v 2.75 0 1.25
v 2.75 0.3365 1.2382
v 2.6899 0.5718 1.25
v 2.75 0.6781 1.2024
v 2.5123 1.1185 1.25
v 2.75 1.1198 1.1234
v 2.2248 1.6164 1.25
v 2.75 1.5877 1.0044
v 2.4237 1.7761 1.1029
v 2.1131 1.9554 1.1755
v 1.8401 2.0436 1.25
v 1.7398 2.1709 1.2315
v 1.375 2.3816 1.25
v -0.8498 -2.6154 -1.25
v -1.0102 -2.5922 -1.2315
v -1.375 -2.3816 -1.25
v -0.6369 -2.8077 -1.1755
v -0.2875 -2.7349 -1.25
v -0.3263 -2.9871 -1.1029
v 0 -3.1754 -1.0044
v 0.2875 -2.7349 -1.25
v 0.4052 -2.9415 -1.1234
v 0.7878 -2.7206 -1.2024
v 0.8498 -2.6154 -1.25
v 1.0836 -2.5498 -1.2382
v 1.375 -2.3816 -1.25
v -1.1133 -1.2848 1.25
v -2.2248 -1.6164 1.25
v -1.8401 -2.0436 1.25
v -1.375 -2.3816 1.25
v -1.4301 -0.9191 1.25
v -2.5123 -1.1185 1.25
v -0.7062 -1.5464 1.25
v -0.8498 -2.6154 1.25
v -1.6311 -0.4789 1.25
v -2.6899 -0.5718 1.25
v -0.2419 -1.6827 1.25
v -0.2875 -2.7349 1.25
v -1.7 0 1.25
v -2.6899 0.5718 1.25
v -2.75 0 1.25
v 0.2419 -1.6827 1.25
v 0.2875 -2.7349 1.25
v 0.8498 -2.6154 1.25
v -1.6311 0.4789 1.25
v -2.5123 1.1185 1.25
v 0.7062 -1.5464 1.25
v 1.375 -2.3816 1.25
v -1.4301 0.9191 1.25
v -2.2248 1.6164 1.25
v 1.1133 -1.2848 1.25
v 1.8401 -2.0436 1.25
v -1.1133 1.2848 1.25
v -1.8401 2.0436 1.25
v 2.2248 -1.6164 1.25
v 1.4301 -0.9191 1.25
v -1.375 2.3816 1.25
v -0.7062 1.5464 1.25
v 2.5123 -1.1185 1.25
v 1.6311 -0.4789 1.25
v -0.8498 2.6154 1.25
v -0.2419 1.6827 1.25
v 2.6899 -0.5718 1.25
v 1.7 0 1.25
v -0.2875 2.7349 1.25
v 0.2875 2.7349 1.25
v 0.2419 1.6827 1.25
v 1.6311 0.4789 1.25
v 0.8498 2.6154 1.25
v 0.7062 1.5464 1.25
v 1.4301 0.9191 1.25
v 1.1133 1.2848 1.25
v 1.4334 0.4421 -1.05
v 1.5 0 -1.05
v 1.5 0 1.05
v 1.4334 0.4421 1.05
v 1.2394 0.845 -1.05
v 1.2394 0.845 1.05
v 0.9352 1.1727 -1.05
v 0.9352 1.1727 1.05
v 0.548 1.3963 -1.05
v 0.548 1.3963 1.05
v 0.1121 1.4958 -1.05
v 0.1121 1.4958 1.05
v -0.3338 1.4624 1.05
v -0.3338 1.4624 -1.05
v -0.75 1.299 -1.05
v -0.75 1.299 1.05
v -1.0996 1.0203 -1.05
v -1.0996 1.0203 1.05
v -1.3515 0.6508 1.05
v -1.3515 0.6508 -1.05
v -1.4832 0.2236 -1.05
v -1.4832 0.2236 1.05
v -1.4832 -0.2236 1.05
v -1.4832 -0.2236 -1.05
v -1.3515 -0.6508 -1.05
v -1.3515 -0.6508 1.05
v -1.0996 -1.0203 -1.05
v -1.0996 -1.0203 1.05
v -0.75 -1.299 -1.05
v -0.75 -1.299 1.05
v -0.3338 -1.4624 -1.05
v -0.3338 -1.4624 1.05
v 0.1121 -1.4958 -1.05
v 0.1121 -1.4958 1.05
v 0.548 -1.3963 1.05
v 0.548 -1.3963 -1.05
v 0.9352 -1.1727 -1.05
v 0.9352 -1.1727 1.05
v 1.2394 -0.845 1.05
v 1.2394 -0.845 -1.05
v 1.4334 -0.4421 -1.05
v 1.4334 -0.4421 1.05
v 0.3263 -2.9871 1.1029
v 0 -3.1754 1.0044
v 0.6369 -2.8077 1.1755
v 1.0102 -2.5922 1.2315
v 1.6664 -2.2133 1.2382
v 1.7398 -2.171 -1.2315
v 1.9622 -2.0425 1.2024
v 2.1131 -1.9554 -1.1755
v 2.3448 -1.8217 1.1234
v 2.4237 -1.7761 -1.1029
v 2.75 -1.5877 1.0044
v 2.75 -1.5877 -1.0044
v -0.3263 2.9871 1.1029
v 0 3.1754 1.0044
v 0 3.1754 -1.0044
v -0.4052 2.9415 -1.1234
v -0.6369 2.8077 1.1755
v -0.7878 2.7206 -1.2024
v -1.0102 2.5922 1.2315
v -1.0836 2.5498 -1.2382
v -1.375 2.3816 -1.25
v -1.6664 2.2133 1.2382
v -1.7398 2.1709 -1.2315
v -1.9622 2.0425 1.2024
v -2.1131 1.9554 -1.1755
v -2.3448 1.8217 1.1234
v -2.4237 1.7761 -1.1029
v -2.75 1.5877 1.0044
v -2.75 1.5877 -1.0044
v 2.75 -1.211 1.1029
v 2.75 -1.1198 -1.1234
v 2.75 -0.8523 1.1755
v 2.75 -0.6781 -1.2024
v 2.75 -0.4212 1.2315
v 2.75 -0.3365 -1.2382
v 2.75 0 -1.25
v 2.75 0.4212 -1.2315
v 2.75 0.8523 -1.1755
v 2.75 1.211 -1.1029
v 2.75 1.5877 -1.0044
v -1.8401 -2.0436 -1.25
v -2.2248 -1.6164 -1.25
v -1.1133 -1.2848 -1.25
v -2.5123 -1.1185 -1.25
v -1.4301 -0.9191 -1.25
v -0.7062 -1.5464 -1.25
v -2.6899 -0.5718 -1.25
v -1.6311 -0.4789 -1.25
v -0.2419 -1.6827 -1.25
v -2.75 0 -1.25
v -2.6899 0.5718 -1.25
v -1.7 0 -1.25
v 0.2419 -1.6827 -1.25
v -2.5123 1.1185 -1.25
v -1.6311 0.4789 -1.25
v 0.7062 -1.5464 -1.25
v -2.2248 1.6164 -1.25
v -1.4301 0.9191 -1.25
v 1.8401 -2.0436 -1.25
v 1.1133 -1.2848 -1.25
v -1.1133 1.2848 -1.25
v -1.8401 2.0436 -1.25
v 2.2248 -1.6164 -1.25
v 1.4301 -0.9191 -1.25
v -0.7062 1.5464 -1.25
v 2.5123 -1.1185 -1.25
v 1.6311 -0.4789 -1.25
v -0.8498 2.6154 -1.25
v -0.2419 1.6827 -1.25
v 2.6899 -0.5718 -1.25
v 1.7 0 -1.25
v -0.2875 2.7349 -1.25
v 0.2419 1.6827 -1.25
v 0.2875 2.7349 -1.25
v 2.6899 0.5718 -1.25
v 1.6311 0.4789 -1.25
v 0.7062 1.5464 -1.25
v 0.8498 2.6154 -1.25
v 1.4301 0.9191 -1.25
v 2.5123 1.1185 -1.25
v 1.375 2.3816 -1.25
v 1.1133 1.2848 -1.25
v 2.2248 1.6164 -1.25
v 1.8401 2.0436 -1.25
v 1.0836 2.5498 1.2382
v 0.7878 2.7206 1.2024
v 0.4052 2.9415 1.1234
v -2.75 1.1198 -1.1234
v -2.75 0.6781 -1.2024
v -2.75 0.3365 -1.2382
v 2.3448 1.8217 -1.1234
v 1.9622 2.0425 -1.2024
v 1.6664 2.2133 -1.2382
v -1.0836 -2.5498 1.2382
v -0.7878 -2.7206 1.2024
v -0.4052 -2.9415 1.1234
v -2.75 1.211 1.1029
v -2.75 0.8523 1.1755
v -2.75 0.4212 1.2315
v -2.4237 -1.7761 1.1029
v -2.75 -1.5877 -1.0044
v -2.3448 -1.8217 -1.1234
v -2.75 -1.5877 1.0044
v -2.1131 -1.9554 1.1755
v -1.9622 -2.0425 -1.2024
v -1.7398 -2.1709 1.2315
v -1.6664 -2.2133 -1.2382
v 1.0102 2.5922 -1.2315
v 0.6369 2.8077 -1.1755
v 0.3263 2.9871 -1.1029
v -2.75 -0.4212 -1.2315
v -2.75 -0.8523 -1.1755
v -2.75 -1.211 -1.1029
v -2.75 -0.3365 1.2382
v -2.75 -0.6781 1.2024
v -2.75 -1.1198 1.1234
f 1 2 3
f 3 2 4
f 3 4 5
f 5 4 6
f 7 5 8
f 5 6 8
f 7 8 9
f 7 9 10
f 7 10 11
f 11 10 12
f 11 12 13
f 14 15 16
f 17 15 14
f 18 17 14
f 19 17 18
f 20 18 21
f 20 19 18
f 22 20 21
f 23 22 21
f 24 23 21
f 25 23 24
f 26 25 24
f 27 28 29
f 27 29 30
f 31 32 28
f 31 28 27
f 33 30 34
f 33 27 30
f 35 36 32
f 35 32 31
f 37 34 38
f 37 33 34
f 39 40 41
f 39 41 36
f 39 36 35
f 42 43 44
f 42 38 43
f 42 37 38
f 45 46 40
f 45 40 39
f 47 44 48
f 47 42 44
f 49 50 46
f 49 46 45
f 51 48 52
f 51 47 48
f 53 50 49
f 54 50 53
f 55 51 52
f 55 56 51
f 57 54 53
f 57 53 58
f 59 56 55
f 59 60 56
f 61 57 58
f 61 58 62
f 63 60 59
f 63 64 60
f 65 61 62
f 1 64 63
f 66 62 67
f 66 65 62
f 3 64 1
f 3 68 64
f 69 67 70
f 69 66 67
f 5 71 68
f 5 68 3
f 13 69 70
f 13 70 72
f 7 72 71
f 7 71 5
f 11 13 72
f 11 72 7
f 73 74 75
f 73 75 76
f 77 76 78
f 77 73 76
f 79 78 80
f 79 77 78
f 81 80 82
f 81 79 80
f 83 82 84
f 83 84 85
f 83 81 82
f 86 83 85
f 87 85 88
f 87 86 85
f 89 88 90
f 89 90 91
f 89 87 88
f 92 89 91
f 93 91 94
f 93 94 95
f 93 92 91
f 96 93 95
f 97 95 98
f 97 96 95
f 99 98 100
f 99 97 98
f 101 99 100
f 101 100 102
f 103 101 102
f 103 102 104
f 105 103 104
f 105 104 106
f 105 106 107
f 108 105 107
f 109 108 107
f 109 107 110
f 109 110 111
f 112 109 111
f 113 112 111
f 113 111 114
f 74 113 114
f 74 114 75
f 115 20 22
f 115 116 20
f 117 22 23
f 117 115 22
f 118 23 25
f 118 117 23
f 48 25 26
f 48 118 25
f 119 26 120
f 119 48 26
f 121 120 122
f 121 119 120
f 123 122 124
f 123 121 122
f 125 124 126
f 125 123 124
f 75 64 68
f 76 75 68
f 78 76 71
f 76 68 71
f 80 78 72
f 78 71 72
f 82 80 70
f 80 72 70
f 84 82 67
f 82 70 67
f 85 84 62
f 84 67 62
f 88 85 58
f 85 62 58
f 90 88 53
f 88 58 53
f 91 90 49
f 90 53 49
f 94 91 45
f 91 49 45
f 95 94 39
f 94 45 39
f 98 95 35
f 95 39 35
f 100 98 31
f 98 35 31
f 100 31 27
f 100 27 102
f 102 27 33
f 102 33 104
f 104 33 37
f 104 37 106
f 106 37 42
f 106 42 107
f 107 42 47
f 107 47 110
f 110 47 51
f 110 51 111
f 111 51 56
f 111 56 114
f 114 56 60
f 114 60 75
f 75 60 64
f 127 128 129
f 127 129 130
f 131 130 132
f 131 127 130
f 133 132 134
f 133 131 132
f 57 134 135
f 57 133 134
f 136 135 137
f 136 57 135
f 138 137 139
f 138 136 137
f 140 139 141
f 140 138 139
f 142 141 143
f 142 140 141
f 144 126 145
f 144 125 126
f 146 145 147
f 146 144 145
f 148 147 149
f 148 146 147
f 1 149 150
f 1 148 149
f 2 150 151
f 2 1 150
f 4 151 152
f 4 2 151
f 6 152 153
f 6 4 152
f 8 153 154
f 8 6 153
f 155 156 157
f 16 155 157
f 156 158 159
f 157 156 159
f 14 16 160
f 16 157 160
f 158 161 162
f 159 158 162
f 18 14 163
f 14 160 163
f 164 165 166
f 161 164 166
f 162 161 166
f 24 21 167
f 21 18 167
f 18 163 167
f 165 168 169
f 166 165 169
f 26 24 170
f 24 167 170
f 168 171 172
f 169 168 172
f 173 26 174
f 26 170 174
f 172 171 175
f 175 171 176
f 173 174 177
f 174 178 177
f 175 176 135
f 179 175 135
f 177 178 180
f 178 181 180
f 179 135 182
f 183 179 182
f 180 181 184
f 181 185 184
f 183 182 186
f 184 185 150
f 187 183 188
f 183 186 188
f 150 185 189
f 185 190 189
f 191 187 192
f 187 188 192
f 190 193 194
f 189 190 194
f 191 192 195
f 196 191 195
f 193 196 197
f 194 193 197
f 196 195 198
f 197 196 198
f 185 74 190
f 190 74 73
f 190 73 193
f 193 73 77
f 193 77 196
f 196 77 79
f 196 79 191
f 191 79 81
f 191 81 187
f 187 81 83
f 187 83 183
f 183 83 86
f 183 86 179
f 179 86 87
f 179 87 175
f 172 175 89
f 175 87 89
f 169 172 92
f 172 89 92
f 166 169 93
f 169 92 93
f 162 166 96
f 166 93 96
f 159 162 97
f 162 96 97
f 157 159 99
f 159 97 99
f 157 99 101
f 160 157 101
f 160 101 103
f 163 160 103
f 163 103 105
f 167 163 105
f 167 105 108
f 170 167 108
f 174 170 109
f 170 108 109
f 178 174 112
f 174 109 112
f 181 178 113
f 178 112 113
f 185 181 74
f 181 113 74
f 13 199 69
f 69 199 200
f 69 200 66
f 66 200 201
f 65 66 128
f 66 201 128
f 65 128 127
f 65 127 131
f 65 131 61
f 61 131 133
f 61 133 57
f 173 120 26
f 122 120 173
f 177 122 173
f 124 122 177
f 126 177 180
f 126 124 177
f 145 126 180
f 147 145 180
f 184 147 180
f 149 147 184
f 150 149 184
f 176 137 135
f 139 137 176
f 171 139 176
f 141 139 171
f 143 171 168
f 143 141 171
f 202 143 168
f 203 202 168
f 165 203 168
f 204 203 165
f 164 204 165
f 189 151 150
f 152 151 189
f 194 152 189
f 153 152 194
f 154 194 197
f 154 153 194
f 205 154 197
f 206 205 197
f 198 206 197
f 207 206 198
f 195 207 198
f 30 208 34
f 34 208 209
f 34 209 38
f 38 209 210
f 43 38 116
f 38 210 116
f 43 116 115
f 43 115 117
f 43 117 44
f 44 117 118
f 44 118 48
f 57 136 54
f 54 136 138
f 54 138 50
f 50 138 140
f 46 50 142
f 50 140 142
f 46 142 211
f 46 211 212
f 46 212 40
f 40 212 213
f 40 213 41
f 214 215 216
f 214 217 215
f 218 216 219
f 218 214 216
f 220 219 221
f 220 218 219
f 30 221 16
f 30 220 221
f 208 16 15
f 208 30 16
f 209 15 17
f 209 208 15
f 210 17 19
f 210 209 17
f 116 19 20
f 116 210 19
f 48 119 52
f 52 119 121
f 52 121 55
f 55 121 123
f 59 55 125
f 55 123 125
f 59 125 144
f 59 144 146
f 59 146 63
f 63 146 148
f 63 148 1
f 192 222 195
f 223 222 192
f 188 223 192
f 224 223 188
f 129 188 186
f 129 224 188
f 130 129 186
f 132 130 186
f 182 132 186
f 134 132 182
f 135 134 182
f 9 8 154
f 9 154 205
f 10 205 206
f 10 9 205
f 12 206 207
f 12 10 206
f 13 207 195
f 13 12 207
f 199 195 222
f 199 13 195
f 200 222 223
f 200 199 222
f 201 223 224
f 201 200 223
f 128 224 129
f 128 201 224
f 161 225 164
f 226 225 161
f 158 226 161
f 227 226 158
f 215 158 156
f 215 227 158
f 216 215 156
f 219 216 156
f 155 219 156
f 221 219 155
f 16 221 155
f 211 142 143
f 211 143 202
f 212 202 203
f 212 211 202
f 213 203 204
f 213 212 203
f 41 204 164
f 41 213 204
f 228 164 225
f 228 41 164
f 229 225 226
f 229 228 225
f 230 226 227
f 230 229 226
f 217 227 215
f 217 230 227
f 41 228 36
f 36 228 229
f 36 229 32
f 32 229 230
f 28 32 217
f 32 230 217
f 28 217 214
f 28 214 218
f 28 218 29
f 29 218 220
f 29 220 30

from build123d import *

# Parameters (mm, degrees)
SKETCH021_R     = 1.5
PAD011_DEPTH    = 1.25
CHAMFER004_SIZE = 0.2


with BuildPart() as part:
    # Sketch021 → Pad011 (new body, symmetric)
    with BuildSketch(Plane.XY):
        Polygon((2.75, -1.5877132403), (2.75, 1.5877132403), (0, 3.1754264805), (-2.75, 1.5877132403), (-2.75, -1.5877132403), (0, -3.1754264805), align=None)
        Circle(SKETCH021_R, mode=Mode.SUBTRACT)
    extrude(amount=PAD011_DEPTH, both=True)

    # Sketch020 → Groove002 (revolve, cut)
    with BuildSketch(Plane.YZ):
        Polygon((-2.75, 1.25), (-3.5, 0.8169872981), (-3.5, 1.25), align=None)
        Polygon((-2.75, -1.25), (-3.5, -0.8169872981), (-3.5, -1.25), align=None)
    revolve(axis=Axis((0, 0, 0), (0, 0, 1)), mode=Mode.SUBTRACT)

    # Chamfer004
    chamfer004_edges = [part.edges().sort_by_distance(p)[0] for p in [
        (-1.5, 0, 1.25),
        (-1.5, 0, -1.25),
    ]]
    chamfer(chamfer004_edges, length=CHAMFER004_SIZE)


solid = part.part
